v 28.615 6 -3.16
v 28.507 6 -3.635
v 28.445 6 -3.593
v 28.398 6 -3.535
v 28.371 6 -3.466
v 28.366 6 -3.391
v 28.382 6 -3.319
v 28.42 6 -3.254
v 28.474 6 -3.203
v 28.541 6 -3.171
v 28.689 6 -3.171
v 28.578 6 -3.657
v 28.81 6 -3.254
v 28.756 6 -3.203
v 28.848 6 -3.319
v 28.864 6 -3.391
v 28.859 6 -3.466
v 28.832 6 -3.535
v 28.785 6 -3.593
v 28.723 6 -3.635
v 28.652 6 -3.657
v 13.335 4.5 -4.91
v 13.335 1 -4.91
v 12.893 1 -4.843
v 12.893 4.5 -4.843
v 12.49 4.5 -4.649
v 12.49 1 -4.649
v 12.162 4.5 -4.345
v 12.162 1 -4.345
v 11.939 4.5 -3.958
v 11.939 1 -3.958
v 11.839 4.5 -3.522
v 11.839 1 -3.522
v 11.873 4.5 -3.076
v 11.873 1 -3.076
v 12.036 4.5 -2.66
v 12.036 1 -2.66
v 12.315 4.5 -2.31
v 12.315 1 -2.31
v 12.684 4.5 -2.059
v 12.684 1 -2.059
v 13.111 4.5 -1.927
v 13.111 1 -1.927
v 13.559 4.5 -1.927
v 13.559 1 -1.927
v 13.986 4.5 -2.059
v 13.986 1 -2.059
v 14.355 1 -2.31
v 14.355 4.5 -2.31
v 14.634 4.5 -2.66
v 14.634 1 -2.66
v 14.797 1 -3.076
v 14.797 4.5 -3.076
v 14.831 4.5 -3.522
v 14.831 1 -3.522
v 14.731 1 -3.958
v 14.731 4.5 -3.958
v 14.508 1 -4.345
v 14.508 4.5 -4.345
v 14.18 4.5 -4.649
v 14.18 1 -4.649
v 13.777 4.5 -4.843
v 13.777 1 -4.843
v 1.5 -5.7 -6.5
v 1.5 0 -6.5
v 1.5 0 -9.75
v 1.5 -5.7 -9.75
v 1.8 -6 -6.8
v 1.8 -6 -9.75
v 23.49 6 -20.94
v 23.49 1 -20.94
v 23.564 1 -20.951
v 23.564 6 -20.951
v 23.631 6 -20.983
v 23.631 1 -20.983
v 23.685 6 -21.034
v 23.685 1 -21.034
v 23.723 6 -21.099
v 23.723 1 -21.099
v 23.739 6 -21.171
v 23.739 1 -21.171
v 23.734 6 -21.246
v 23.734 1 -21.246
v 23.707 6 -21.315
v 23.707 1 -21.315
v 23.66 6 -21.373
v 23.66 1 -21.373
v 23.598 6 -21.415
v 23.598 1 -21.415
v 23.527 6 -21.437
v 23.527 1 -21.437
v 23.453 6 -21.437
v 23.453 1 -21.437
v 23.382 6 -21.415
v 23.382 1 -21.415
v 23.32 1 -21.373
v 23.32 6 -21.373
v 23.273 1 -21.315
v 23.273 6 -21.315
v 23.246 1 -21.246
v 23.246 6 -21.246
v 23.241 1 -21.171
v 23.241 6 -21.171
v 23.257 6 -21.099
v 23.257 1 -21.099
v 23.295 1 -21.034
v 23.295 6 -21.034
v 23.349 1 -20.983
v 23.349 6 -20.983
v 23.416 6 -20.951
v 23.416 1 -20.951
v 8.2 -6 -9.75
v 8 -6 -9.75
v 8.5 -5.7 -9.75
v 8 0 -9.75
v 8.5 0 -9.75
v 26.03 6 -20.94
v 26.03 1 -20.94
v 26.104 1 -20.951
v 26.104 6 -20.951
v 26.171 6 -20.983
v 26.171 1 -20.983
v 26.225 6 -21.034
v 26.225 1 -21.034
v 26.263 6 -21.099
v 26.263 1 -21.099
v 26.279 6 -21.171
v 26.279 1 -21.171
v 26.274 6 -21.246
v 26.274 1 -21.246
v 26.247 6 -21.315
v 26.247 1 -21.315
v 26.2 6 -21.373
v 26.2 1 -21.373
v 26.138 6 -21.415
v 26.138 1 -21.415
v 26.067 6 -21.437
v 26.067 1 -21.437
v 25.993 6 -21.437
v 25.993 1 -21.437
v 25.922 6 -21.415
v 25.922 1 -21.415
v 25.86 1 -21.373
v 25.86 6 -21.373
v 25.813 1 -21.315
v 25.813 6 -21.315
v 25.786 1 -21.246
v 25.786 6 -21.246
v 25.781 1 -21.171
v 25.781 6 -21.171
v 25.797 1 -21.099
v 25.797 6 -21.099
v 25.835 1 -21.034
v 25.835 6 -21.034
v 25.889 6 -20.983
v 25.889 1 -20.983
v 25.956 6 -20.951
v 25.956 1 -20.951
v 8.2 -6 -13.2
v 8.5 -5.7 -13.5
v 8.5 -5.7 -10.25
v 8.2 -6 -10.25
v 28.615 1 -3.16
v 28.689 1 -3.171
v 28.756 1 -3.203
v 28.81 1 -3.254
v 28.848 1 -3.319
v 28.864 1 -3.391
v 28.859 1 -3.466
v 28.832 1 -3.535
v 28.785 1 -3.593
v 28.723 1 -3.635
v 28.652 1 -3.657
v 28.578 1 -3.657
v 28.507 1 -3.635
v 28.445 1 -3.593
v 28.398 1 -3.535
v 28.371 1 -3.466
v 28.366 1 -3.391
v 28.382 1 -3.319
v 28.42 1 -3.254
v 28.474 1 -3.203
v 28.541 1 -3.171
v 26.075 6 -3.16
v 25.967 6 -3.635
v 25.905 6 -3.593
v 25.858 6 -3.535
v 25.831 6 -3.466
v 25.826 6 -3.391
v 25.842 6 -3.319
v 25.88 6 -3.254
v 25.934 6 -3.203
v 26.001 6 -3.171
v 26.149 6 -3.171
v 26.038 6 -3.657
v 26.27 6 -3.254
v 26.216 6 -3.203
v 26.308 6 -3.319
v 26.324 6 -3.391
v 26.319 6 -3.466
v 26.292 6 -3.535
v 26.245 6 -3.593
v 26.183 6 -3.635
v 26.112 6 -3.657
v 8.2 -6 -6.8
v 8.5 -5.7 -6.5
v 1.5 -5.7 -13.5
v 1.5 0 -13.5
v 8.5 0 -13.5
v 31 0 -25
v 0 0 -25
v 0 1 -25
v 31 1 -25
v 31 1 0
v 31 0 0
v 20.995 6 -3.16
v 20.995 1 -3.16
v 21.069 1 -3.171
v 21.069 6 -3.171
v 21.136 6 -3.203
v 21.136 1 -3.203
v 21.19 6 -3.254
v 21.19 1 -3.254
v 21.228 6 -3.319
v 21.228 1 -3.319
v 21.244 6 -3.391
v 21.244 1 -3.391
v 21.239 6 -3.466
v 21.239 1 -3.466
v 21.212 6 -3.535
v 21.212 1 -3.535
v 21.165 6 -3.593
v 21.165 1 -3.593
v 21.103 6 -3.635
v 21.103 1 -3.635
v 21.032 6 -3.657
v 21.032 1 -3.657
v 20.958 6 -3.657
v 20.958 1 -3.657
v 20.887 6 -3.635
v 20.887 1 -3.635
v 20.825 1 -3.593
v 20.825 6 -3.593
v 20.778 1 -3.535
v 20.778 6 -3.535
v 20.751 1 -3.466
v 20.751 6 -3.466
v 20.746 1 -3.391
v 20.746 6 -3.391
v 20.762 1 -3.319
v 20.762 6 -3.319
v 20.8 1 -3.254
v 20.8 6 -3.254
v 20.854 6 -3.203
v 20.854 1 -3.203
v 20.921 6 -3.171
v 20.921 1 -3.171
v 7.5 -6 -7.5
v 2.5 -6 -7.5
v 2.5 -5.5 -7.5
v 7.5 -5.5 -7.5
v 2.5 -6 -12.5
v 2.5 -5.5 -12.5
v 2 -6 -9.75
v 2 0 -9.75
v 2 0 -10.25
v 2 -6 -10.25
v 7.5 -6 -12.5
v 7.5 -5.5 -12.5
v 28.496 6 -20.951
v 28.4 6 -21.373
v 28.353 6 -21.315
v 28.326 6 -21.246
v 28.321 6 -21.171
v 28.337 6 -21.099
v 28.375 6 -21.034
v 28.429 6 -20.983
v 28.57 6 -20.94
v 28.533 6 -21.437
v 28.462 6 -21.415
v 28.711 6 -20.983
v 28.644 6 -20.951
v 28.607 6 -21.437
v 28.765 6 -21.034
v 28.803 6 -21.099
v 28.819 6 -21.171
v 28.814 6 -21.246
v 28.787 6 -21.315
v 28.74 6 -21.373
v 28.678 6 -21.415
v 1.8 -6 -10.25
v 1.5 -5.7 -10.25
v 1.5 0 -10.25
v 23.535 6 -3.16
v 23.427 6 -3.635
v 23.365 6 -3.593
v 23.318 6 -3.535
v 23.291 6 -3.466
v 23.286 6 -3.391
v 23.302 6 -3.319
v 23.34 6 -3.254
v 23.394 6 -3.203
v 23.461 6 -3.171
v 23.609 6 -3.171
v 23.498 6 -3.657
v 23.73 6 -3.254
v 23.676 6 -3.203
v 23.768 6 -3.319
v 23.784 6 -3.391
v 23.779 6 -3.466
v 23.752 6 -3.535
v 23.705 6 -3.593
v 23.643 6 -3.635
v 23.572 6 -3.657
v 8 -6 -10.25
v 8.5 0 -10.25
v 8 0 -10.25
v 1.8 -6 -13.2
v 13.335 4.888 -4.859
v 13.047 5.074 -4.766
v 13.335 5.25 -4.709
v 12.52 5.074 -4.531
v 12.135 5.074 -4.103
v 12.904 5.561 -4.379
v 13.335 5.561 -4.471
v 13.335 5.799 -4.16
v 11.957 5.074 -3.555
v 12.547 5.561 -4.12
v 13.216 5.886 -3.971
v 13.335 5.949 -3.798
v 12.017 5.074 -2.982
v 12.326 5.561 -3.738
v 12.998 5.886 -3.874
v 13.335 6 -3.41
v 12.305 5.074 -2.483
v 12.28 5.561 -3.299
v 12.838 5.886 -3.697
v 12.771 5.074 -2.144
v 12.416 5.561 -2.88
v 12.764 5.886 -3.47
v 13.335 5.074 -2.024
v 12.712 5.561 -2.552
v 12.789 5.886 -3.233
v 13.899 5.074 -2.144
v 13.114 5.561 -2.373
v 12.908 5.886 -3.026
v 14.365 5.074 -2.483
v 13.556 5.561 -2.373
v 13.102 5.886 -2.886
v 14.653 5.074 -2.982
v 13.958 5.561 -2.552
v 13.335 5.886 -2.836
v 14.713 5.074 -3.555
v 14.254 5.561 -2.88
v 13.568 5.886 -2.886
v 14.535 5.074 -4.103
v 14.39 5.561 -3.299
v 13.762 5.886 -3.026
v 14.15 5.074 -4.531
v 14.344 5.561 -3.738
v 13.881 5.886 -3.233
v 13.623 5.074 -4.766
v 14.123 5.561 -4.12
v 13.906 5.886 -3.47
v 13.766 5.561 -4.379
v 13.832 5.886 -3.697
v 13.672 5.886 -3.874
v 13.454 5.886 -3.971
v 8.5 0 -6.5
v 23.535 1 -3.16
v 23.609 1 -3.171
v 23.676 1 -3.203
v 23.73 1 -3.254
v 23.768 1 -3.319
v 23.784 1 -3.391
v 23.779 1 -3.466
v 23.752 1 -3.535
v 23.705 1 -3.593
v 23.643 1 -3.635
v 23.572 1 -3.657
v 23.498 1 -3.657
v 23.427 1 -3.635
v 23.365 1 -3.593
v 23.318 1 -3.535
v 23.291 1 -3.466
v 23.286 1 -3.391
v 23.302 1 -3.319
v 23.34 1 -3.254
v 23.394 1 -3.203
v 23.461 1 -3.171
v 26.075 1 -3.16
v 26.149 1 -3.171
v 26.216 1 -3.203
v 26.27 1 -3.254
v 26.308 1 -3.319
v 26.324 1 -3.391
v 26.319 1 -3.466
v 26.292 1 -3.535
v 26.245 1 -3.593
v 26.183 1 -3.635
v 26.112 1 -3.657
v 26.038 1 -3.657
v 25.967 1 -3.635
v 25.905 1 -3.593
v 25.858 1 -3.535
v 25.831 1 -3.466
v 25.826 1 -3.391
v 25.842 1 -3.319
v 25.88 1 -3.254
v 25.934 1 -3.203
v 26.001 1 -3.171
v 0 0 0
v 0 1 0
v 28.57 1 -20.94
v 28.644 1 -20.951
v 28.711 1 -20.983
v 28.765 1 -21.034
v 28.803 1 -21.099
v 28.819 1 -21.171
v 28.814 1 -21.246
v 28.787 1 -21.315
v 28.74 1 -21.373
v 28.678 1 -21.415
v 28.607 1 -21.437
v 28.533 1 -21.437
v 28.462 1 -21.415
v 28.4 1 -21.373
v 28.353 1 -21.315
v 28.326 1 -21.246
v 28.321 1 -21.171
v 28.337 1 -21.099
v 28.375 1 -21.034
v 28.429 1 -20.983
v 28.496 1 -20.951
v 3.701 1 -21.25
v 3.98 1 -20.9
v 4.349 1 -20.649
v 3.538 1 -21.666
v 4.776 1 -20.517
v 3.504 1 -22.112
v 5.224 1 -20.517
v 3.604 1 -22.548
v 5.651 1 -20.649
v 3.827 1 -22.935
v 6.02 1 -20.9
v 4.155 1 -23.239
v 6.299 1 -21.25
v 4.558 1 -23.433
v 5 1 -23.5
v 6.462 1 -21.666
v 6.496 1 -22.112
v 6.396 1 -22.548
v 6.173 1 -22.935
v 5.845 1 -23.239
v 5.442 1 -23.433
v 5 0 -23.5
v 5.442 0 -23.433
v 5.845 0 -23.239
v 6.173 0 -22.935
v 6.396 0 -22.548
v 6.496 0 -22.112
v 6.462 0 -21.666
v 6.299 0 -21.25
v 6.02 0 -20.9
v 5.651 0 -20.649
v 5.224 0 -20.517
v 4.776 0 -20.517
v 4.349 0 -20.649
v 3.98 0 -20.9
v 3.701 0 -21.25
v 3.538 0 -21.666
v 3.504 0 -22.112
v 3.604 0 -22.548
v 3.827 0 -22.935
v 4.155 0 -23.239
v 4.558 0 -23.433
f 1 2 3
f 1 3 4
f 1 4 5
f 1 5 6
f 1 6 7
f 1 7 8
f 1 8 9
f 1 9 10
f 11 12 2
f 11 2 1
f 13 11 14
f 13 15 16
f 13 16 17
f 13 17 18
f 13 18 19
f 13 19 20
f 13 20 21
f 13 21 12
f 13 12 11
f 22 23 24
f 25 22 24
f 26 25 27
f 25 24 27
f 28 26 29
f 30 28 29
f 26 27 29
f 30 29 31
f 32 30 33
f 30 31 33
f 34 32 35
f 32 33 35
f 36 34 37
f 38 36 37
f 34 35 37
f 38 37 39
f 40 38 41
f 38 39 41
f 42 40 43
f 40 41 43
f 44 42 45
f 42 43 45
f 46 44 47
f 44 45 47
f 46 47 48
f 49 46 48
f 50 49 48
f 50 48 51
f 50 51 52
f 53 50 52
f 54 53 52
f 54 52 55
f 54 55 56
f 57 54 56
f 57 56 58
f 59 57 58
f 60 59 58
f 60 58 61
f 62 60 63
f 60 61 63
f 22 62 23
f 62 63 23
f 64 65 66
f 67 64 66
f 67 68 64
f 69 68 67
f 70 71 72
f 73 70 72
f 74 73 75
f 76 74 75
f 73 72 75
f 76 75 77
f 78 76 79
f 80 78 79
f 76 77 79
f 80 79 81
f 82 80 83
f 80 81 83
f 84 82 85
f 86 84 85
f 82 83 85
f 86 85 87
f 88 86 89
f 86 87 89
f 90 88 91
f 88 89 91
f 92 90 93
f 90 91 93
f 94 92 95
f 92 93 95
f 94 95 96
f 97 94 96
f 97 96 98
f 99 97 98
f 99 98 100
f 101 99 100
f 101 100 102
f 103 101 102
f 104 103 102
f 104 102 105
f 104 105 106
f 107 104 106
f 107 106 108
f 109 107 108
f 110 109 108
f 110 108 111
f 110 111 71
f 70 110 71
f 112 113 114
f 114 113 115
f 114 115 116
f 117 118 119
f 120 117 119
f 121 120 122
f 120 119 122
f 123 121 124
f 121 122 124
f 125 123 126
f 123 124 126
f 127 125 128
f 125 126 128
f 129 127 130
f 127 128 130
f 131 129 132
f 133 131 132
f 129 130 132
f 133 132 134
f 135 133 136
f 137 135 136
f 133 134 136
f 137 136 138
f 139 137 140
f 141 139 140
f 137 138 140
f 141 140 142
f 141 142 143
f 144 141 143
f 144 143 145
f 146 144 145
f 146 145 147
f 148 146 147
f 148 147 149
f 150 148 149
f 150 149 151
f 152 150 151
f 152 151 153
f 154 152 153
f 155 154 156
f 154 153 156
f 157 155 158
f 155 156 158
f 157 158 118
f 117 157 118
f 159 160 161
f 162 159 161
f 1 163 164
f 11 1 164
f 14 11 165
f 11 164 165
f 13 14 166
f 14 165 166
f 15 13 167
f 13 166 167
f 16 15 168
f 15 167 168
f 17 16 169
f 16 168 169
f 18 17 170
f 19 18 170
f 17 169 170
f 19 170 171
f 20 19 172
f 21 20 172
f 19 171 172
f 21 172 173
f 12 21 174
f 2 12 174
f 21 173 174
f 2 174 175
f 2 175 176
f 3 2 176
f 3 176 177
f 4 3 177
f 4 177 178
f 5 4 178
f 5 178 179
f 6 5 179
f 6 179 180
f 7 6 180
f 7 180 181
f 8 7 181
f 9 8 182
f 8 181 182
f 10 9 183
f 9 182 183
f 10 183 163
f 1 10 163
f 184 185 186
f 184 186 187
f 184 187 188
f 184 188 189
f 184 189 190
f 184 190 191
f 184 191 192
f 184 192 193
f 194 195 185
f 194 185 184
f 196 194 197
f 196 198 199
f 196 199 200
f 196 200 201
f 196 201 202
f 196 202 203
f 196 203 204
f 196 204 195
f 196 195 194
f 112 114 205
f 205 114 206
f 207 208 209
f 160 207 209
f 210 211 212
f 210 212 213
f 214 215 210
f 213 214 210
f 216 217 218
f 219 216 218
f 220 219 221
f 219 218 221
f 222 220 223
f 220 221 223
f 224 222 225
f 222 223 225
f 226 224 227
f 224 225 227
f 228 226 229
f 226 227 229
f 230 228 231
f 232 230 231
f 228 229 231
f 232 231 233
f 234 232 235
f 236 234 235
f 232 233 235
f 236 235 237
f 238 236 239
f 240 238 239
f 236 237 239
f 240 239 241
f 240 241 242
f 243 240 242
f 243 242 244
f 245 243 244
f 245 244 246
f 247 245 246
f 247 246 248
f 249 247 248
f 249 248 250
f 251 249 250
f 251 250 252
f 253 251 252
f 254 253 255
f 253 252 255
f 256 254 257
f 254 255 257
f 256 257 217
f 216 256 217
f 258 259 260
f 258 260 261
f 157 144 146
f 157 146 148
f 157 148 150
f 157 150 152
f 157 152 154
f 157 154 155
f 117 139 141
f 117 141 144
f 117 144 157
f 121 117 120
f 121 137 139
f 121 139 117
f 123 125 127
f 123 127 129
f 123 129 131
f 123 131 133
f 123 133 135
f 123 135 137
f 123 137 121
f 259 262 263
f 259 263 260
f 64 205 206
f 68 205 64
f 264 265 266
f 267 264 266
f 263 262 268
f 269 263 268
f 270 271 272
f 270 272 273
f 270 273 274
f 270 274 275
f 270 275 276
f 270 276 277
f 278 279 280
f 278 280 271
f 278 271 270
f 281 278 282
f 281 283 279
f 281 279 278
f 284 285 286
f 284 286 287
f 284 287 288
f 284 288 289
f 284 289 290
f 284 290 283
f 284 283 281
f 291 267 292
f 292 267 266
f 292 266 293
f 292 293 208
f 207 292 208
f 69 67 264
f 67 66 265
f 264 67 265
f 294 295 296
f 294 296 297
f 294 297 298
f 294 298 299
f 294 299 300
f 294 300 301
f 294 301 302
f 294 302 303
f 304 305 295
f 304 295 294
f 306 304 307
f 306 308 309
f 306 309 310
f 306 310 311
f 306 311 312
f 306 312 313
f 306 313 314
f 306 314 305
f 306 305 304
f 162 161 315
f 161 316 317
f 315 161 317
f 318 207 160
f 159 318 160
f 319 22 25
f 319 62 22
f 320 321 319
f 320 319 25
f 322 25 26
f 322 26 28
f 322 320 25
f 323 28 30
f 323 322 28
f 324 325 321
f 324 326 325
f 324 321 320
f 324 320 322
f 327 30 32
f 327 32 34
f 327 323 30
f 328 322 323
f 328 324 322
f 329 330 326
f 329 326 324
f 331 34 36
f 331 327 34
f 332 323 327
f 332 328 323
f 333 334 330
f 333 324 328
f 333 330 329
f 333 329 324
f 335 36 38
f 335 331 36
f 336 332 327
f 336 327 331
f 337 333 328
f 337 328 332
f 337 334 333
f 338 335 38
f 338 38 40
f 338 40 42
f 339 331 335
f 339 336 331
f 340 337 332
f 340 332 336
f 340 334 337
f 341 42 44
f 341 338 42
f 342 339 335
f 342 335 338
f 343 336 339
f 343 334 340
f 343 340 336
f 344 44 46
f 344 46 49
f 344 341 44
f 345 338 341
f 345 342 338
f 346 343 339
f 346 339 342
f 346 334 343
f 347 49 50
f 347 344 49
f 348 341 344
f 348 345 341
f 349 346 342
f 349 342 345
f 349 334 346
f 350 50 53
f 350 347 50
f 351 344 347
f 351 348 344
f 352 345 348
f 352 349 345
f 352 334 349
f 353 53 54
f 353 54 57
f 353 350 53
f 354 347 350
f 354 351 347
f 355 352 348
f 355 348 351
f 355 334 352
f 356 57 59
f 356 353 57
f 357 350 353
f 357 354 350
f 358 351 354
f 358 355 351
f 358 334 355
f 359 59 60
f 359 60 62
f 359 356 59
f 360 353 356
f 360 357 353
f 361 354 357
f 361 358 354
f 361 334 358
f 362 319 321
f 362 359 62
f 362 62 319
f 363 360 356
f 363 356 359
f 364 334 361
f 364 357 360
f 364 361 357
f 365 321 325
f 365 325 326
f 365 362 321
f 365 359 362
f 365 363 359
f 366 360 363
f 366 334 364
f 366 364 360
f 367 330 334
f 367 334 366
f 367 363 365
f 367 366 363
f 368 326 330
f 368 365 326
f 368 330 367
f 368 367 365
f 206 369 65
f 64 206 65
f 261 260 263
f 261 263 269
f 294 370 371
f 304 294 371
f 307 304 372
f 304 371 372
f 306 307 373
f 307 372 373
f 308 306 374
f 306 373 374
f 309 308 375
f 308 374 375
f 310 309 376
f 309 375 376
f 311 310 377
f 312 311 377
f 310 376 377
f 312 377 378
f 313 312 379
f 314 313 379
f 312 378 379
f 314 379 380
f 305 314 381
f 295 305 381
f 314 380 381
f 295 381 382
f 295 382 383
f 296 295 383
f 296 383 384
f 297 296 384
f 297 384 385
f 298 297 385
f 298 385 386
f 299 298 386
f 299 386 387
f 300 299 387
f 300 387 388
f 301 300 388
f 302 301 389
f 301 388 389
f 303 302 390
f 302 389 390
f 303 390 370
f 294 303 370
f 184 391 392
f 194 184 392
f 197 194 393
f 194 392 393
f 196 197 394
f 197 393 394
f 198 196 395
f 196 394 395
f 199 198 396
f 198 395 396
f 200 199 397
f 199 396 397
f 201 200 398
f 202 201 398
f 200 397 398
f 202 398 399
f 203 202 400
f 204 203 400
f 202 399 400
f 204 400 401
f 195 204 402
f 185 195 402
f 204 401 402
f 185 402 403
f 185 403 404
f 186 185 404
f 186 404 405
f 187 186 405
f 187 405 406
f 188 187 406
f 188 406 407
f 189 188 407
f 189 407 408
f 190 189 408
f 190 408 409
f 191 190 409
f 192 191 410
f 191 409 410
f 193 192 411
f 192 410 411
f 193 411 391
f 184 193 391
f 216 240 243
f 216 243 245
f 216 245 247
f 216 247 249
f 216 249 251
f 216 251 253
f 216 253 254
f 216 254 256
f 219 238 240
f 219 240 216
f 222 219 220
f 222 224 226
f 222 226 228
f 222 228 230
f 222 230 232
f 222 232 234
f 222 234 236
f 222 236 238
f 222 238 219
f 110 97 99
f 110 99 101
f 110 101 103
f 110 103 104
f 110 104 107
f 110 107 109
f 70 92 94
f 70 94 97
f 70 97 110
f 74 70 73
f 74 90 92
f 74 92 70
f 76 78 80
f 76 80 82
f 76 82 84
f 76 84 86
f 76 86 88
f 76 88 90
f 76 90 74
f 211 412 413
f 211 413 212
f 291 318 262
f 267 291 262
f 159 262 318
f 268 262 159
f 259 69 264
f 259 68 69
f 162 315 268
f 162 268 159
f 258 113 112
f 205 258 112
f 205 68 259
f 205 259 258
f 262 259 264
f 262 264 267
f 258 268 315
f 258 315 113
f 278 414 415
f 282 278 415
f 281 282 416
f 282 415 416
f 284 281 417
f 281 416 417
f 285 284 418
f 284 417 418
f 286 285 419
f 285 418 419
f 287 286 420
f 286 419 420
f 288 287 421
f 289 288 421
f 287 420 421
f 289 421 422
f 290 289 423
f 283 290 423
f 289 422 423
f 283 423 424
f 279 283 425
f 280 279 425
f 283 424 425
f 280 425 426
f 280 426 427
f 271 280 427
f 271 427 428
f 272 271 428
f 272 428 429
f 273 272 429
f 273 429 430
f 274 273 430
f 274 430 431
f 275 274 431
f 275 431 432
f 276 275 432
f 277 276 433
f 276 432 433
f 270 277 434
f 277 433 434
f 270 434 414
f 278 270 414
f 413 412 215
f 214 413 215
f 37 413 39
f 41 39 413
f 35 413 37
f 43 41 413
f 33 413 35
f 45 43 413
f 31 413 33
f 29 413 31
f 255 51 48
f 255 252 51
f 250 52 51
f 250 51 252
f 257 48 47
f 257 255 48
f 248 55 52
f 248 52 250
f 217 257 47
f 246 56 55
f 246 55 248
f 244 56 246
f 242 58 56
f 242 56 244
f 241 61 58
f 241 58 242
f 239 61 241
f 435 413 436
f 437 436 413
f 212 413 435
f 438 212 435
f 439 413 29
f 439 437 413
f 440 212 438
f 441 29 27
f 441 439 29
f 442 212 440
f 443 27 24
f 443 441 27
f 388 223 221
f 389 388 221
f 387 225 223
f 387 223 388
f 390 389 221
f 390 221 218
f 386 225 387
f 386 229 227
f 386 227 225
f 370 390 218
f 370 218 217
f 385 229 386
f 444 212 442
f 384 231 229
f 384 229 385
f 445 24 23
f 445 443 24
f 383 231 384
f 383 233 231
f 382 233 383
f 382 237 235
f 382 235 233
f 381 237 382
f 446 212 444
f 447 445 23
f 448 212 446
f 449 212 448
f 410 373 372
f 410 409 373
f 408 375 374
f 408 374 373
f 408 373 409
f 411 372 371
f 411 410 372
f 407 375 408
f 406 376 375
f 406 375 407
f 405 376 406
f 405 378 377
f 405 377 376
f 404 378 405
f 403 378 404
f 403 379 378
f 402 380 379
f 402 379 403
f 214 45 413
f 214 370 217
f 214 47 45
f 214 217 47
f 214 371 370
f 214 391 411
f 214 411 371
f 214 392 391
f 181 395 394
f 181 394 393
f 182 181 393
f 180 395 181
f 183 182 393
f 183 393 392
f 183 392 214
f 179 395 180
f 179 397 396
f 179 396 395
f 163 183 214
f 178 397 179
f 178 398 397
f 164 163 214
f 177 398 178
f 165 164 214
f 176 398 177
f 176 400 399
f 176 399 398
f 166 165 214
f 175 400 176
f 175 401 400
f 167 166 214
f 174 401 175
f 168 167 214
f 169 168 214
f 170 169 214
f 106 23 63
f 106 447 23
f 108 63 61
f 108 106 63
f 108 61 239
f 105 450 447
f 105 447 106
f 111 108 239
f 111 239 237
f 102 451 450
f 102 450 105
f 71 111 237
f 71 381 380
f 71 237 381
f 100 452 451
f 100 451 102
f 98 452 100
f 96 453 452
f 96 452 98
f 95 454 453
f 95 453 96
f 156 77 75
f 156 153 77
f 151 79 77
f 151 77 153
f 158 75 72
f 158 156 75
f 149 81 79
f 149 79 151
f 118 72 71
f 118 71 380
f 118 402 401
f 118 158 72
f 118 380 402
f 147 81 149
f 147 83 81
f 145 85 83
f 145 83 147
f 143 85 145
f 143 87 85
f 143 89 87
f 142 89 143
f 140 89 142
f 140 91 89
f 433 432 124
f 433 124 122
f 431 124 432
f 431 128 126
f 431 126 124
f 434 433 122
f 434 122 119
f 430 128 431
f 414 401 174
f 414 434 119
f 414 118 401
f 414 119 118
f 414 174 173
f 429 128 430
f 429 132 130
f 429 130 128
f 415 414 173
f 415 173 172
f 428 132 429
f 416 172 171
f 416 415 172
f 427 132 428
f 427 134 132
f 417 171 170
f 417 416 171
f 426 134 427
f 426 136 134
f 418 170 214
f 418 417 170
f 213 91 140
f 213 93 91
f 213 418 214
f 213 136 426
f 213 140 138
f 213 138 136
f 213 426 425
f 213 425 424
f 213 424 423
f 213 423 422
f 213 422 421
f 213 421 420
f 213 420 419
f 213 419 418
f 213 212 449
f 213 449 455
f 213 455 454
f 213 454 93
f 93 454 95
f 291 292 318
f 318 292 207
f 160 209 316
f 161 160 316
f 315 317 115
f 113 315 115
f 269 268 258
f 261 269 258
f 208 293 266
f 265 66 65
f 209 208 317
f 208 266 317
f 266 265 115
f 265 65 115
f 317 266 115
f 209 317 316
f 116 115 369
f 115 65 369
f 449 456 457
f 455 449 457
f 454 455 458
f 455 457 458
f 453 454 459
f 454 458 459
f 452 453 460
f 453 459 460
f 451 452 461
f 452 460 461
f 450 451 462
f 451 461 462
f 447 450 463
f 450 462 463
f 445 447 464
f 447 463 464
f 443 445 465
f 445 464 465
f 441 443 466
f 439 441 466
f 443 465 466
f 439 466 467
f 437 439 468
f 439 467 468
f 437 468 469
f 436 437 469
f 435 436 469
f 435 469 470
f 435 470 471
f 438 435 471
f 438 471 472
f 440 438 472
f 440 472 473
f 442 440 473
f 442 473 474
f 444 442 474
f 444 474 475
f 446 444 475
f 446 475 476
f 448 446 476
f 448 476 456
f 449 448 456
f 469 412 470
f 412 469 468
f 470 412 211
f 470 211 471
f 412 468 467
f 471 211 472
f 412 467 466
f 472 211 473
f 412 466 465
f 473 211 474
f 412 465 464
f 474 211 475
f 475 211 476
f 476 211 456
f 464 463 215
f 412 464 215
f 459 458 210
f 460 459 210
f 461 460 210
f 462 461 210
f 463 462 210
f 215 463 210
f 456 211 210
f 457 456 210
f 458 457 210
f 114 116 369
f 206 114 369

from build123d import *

# Parameters (mm, degrees)
SKICA1_W                  = 31
SKICA1_H                  = 25
P_IDAT_VYSUNUT_M1_DEPTH   = 1
P_IDAT_VYSUNUT_M2_DEPTH   = 6
SKICA3_W                  = 5
SKICA3_H                  = 5
ODEBRAT_VYSUNUT_M1_DEPTH  = 0.5
SKICA4_R                  = 1.5
ODEBRAT_VYSUNUT_M2_DEPTH  = 41.274061131
ZKOSEN_1_SIZE             = 0.3
SKICA5_R                  = 0.25
P_IDAT_VYSUNUT_M3_DEPTH   = 5
P_IDAT_VYSUNUT_M3_2_DEPTH = 5
P_IDAT_VYSUNUT_M3_3_DEPTH = 5
P_IDAT_VYSUNUT_M3_4_DEPTH = 5
P_IDAT_VYSUNUT_M3_5_DEPTH = 5
P_IDAT_VYSUNUT_M3_6_DEPTH = 5
P_IDAT_VYSUNUT_M3_7_DEPTH = 5
SKICA7_R                  = 0.25
P_IDAT_VYSUNUT_M5_DEPTH   = 0.5
SKICA6_R                  = 1.5
P_IDAT_VYSUNUT_M4_DEPTH   = 5
ZAOBLIT1_R                = 1.5


with BuildPart() as part:
    # Skica1 → Přidat vysunutím1 (new body)
    with BuildSketch(Plane(origin=(0, 0, 0), x_dir=(1, 0, 0), z_dir=(0, 1, 0))):
        with Locations((15.5, 12.5)):
            Rectangle(SKICA1_W, SKICA1_H)
    extrude(amount=P_IDAT_VYSUNUT_M1_DEPTH)

    # Skica4 → Odebrat vysunutím2 (cut, through all)
    with BuildSketch(Plane.XZ):
        with Locations(Location((5, -22, 0), (0, 0, 270))):
            Circle(SKICA4_R)
    extrude(amount=-ODEBRAT_VYSUNUT_M2_DEPTH, mode=Mode.SUBTRACT)



with BuildPart() as body_2:
    # Skica2 → Přidat vysunutím2 (new body)
    with BuildSketch(Plane.XZ):
        Polygon((1.5, -6.5), (1.5, -9.75), (2, -9.75), (2, -10.25), (1.5, -10.25), (1.5, -13.5), (8.5, -13.5), (8.5, -10.25), (8, -10.25), (8, -9.75), (8.5, -9.75), (8.5, -6.5), align=None)
    extrude(amount=P_IDAT_VYSUNUT_M2_DEPTH)

    # Skica3 → Odebrat vysunutím1 (cut)
    with BuildSketch(Plane.XZ.offset(6)):
        with Locations((5, -10)):
            Rectangle(SKICA3_W, SKICA3_H)
    extrude(amount=-ODEBRAT_VYSUNUT_M1_DEPTH, mode=Mode.SUBTRACT)

    # Zkosení1
    zkosen_1_edges = [body_2.edges().sort_by_distance(p)[0] for p in [
        (1.5, -6, -11.875),
        (5, -6, -13.5),
        (8.5, -6, -11.875),
        (8.5, -6, -8.125),
        (5, -6, -6.5),
        (1.5, -6, -8.125),
    ]]
    chamfer(zkosen_1_edges, length=ZKOSEN_1_SIZE)


with BuildPart() as body_3:
    # Skica5 → Přidat vysunutím3 (new body)
    with BuildSketch(Plane(origin=(0, 1, 0), x_dir=(1, 0, 0), z_dir=(0, 1, 0))):
        with Locations(Location((20.995, 3.41, 0), (0, 0, 270))):
            Circle(SKICA5_R)
    extrude(amount=P_IDAT_VYSUNUT_M3_DEPTH)


with BuildPart() as body_4:
    # Skica5 → P_idat vysunut_m3 2 (new body)
    with BuildSketch(Plane(origin=(0, 1, 0), x_dir=(1, 0, 0), z_dir=(0, 1, 0))):
        with Locations(Location((23.535, 3.41, 0), (0, 0, 270))):
            Circle(SKICA5_R)
    extrude(amount=P_IDAT_VYSUNUT_M3_2_DEPTH)


with BuildPart() as body_5:
    # Skica5 → P_idat vysunut_m3 3 (new body)
    with BuildSketch(Plane(origin=(0, 1, 0), x_dir=(1, 0, 0), z_dir=(0, 1, 0))):
        with Locations(Location((26.075, 3.41, 0), (0, 0, 270))):
            Circle(SKICA5_R)
    extrude(amount=P_IDAT_VYSUNUT_M3_3_DEPTH)


with BuildPart() as body_6:
    # Skica5 → P_idat vysunut_m3 4 (new body)
    with BuildSketch(Plane(origin=(0, 1, 0), x_dir=(1, 0, 0), z_dir=(0, 1, 0))):
        with Locations(Location((28.615, 3.41, 0), (0, 0, 270))):
            Circle(SKICA5_R)
    extrude(amount=P_IDAT_VYSUNUT_M3_4_DEPTH)


with BuildPart() as body_7:
    # Skica5 → P_idat vysunut_m3 5 (new body)
    with BuildSketch(Plane(origin=(0, 1, 0), x_dir=(1, 0, 0), z_dir=(0, 1, 0))):
        with Locations(Location((28.57, 21.19, 0), (0, 0, 270))):
            Circle(SKICA5_R)
    extrude(amount=P_IDAT_VYSUNUT_M3_5_DEPTH)


with BuildPart() as body_8:
    # Skica5 → P_idat vysunut_m3 6 (new body)
    with BuildSketch(Plane(origin=(0, 1, 0), x_dir=(1, 0, 0), z_dir=(0, 1, 0))):
        with Locations(Location((26.03, 21.19, 0), (0, 0, 270))):
            Circle(SKICA5_R)
    extrude(amount=P_IDAT_VYSUNUT_M3_6_DEPTH)


with BuildPart() as body_9:
    # Skica5 → P_idat vysunut_m3 7 (new body)
    with BuildSketch(Plane(origin=(0, 1, 0), x_dir=(1, 0, 0), z_dir=(0, 1, 0))):
        with Locations(Location((23.49, 21.19, 0), (0, 0, 270))):
            Circle(SKICA5_R)
    extrude(amount=P_IDAT_VYSUNUT_M3_7_DEPTH)


with BuildPart() as part_1:
    add(part.part)

    add(body_3.part)  # Přidat vysunutím5 merges body 3

    add(body_4.part)  # Přidat vysunutím5 merges body 4

    add(body_5.part)  # Přidat vysunutím5 merges body 5

    add(body_6.part)  # Přidat vysunutím5 merges body 6

    add(body_7.part)  # Přidat vysunutím5 merges body 7

    add(body_8.part)  # Přidat vysunutím5 merges body 8

    add(body_9.part)  # Přidat vysunutím5 merges body 9
    # Skica7 → Přidat vysunutím5 (add)
    with BuildSketch(Plane(origin=(0, 1, 0), x_dir=(1, 0, 0), z_dir=(0, 1, 0))):
        with Locations(Location((23.49, 21.19, 0), (0, 0, 90))):
            Circle(SKICA7_R)
        with Locations(Location((26.03, 21.19, 0), (0, 0, 90))):
            Circle(SKICA7_R)
        with Locations(Location((28.57, 21.19, 0), (0, 0, 90))):
            Circle(SKICA7_R)
        with Locations(Location((20.995, 3.41, 0), (0, 0, 90))):
            Circle(SKICA7_R)
        with Locations(Location((23.535, 3.41, 0), (0, 0, 90))):
            Circle(SKICA7_R)
        with Locations(Location((26.075, 3.41, 0), (0, 0, 90))):
            Circle(SKICA7_R)
        with Locations(Location((28.615, 3.41, 0), (0, 0, 90))):
            Circle(SKICA7_R)
    extrude(amount=P_IDAT_VYSUNUT_M5_DEPTH)

    # Skica6 → Přidat vysunutím4 (add)
    with BuildSketch(Plane(origin=(0, 1, 0), x_dir=(1, 0, 0), z_dir=(0, 1, 0))):
        with Locations(Location((13.335, 3.41, 0), (0, 0, 90))):
            Circle(SKICA6_R)
    extrude(amount=P_IDAT_VYSUNUT_M4_DEPTH)

    # Zaoblit1
    zaoblit1_edges = [part_1.edges().sort_by_distance(p)[0] for p in [
        (13.335, 6, -1.91),
    ]]
    fillet(zaoblit1_edges, radius=ZAOBLIT1_R)


solid = Compound([body_2.part, part_1.part])
